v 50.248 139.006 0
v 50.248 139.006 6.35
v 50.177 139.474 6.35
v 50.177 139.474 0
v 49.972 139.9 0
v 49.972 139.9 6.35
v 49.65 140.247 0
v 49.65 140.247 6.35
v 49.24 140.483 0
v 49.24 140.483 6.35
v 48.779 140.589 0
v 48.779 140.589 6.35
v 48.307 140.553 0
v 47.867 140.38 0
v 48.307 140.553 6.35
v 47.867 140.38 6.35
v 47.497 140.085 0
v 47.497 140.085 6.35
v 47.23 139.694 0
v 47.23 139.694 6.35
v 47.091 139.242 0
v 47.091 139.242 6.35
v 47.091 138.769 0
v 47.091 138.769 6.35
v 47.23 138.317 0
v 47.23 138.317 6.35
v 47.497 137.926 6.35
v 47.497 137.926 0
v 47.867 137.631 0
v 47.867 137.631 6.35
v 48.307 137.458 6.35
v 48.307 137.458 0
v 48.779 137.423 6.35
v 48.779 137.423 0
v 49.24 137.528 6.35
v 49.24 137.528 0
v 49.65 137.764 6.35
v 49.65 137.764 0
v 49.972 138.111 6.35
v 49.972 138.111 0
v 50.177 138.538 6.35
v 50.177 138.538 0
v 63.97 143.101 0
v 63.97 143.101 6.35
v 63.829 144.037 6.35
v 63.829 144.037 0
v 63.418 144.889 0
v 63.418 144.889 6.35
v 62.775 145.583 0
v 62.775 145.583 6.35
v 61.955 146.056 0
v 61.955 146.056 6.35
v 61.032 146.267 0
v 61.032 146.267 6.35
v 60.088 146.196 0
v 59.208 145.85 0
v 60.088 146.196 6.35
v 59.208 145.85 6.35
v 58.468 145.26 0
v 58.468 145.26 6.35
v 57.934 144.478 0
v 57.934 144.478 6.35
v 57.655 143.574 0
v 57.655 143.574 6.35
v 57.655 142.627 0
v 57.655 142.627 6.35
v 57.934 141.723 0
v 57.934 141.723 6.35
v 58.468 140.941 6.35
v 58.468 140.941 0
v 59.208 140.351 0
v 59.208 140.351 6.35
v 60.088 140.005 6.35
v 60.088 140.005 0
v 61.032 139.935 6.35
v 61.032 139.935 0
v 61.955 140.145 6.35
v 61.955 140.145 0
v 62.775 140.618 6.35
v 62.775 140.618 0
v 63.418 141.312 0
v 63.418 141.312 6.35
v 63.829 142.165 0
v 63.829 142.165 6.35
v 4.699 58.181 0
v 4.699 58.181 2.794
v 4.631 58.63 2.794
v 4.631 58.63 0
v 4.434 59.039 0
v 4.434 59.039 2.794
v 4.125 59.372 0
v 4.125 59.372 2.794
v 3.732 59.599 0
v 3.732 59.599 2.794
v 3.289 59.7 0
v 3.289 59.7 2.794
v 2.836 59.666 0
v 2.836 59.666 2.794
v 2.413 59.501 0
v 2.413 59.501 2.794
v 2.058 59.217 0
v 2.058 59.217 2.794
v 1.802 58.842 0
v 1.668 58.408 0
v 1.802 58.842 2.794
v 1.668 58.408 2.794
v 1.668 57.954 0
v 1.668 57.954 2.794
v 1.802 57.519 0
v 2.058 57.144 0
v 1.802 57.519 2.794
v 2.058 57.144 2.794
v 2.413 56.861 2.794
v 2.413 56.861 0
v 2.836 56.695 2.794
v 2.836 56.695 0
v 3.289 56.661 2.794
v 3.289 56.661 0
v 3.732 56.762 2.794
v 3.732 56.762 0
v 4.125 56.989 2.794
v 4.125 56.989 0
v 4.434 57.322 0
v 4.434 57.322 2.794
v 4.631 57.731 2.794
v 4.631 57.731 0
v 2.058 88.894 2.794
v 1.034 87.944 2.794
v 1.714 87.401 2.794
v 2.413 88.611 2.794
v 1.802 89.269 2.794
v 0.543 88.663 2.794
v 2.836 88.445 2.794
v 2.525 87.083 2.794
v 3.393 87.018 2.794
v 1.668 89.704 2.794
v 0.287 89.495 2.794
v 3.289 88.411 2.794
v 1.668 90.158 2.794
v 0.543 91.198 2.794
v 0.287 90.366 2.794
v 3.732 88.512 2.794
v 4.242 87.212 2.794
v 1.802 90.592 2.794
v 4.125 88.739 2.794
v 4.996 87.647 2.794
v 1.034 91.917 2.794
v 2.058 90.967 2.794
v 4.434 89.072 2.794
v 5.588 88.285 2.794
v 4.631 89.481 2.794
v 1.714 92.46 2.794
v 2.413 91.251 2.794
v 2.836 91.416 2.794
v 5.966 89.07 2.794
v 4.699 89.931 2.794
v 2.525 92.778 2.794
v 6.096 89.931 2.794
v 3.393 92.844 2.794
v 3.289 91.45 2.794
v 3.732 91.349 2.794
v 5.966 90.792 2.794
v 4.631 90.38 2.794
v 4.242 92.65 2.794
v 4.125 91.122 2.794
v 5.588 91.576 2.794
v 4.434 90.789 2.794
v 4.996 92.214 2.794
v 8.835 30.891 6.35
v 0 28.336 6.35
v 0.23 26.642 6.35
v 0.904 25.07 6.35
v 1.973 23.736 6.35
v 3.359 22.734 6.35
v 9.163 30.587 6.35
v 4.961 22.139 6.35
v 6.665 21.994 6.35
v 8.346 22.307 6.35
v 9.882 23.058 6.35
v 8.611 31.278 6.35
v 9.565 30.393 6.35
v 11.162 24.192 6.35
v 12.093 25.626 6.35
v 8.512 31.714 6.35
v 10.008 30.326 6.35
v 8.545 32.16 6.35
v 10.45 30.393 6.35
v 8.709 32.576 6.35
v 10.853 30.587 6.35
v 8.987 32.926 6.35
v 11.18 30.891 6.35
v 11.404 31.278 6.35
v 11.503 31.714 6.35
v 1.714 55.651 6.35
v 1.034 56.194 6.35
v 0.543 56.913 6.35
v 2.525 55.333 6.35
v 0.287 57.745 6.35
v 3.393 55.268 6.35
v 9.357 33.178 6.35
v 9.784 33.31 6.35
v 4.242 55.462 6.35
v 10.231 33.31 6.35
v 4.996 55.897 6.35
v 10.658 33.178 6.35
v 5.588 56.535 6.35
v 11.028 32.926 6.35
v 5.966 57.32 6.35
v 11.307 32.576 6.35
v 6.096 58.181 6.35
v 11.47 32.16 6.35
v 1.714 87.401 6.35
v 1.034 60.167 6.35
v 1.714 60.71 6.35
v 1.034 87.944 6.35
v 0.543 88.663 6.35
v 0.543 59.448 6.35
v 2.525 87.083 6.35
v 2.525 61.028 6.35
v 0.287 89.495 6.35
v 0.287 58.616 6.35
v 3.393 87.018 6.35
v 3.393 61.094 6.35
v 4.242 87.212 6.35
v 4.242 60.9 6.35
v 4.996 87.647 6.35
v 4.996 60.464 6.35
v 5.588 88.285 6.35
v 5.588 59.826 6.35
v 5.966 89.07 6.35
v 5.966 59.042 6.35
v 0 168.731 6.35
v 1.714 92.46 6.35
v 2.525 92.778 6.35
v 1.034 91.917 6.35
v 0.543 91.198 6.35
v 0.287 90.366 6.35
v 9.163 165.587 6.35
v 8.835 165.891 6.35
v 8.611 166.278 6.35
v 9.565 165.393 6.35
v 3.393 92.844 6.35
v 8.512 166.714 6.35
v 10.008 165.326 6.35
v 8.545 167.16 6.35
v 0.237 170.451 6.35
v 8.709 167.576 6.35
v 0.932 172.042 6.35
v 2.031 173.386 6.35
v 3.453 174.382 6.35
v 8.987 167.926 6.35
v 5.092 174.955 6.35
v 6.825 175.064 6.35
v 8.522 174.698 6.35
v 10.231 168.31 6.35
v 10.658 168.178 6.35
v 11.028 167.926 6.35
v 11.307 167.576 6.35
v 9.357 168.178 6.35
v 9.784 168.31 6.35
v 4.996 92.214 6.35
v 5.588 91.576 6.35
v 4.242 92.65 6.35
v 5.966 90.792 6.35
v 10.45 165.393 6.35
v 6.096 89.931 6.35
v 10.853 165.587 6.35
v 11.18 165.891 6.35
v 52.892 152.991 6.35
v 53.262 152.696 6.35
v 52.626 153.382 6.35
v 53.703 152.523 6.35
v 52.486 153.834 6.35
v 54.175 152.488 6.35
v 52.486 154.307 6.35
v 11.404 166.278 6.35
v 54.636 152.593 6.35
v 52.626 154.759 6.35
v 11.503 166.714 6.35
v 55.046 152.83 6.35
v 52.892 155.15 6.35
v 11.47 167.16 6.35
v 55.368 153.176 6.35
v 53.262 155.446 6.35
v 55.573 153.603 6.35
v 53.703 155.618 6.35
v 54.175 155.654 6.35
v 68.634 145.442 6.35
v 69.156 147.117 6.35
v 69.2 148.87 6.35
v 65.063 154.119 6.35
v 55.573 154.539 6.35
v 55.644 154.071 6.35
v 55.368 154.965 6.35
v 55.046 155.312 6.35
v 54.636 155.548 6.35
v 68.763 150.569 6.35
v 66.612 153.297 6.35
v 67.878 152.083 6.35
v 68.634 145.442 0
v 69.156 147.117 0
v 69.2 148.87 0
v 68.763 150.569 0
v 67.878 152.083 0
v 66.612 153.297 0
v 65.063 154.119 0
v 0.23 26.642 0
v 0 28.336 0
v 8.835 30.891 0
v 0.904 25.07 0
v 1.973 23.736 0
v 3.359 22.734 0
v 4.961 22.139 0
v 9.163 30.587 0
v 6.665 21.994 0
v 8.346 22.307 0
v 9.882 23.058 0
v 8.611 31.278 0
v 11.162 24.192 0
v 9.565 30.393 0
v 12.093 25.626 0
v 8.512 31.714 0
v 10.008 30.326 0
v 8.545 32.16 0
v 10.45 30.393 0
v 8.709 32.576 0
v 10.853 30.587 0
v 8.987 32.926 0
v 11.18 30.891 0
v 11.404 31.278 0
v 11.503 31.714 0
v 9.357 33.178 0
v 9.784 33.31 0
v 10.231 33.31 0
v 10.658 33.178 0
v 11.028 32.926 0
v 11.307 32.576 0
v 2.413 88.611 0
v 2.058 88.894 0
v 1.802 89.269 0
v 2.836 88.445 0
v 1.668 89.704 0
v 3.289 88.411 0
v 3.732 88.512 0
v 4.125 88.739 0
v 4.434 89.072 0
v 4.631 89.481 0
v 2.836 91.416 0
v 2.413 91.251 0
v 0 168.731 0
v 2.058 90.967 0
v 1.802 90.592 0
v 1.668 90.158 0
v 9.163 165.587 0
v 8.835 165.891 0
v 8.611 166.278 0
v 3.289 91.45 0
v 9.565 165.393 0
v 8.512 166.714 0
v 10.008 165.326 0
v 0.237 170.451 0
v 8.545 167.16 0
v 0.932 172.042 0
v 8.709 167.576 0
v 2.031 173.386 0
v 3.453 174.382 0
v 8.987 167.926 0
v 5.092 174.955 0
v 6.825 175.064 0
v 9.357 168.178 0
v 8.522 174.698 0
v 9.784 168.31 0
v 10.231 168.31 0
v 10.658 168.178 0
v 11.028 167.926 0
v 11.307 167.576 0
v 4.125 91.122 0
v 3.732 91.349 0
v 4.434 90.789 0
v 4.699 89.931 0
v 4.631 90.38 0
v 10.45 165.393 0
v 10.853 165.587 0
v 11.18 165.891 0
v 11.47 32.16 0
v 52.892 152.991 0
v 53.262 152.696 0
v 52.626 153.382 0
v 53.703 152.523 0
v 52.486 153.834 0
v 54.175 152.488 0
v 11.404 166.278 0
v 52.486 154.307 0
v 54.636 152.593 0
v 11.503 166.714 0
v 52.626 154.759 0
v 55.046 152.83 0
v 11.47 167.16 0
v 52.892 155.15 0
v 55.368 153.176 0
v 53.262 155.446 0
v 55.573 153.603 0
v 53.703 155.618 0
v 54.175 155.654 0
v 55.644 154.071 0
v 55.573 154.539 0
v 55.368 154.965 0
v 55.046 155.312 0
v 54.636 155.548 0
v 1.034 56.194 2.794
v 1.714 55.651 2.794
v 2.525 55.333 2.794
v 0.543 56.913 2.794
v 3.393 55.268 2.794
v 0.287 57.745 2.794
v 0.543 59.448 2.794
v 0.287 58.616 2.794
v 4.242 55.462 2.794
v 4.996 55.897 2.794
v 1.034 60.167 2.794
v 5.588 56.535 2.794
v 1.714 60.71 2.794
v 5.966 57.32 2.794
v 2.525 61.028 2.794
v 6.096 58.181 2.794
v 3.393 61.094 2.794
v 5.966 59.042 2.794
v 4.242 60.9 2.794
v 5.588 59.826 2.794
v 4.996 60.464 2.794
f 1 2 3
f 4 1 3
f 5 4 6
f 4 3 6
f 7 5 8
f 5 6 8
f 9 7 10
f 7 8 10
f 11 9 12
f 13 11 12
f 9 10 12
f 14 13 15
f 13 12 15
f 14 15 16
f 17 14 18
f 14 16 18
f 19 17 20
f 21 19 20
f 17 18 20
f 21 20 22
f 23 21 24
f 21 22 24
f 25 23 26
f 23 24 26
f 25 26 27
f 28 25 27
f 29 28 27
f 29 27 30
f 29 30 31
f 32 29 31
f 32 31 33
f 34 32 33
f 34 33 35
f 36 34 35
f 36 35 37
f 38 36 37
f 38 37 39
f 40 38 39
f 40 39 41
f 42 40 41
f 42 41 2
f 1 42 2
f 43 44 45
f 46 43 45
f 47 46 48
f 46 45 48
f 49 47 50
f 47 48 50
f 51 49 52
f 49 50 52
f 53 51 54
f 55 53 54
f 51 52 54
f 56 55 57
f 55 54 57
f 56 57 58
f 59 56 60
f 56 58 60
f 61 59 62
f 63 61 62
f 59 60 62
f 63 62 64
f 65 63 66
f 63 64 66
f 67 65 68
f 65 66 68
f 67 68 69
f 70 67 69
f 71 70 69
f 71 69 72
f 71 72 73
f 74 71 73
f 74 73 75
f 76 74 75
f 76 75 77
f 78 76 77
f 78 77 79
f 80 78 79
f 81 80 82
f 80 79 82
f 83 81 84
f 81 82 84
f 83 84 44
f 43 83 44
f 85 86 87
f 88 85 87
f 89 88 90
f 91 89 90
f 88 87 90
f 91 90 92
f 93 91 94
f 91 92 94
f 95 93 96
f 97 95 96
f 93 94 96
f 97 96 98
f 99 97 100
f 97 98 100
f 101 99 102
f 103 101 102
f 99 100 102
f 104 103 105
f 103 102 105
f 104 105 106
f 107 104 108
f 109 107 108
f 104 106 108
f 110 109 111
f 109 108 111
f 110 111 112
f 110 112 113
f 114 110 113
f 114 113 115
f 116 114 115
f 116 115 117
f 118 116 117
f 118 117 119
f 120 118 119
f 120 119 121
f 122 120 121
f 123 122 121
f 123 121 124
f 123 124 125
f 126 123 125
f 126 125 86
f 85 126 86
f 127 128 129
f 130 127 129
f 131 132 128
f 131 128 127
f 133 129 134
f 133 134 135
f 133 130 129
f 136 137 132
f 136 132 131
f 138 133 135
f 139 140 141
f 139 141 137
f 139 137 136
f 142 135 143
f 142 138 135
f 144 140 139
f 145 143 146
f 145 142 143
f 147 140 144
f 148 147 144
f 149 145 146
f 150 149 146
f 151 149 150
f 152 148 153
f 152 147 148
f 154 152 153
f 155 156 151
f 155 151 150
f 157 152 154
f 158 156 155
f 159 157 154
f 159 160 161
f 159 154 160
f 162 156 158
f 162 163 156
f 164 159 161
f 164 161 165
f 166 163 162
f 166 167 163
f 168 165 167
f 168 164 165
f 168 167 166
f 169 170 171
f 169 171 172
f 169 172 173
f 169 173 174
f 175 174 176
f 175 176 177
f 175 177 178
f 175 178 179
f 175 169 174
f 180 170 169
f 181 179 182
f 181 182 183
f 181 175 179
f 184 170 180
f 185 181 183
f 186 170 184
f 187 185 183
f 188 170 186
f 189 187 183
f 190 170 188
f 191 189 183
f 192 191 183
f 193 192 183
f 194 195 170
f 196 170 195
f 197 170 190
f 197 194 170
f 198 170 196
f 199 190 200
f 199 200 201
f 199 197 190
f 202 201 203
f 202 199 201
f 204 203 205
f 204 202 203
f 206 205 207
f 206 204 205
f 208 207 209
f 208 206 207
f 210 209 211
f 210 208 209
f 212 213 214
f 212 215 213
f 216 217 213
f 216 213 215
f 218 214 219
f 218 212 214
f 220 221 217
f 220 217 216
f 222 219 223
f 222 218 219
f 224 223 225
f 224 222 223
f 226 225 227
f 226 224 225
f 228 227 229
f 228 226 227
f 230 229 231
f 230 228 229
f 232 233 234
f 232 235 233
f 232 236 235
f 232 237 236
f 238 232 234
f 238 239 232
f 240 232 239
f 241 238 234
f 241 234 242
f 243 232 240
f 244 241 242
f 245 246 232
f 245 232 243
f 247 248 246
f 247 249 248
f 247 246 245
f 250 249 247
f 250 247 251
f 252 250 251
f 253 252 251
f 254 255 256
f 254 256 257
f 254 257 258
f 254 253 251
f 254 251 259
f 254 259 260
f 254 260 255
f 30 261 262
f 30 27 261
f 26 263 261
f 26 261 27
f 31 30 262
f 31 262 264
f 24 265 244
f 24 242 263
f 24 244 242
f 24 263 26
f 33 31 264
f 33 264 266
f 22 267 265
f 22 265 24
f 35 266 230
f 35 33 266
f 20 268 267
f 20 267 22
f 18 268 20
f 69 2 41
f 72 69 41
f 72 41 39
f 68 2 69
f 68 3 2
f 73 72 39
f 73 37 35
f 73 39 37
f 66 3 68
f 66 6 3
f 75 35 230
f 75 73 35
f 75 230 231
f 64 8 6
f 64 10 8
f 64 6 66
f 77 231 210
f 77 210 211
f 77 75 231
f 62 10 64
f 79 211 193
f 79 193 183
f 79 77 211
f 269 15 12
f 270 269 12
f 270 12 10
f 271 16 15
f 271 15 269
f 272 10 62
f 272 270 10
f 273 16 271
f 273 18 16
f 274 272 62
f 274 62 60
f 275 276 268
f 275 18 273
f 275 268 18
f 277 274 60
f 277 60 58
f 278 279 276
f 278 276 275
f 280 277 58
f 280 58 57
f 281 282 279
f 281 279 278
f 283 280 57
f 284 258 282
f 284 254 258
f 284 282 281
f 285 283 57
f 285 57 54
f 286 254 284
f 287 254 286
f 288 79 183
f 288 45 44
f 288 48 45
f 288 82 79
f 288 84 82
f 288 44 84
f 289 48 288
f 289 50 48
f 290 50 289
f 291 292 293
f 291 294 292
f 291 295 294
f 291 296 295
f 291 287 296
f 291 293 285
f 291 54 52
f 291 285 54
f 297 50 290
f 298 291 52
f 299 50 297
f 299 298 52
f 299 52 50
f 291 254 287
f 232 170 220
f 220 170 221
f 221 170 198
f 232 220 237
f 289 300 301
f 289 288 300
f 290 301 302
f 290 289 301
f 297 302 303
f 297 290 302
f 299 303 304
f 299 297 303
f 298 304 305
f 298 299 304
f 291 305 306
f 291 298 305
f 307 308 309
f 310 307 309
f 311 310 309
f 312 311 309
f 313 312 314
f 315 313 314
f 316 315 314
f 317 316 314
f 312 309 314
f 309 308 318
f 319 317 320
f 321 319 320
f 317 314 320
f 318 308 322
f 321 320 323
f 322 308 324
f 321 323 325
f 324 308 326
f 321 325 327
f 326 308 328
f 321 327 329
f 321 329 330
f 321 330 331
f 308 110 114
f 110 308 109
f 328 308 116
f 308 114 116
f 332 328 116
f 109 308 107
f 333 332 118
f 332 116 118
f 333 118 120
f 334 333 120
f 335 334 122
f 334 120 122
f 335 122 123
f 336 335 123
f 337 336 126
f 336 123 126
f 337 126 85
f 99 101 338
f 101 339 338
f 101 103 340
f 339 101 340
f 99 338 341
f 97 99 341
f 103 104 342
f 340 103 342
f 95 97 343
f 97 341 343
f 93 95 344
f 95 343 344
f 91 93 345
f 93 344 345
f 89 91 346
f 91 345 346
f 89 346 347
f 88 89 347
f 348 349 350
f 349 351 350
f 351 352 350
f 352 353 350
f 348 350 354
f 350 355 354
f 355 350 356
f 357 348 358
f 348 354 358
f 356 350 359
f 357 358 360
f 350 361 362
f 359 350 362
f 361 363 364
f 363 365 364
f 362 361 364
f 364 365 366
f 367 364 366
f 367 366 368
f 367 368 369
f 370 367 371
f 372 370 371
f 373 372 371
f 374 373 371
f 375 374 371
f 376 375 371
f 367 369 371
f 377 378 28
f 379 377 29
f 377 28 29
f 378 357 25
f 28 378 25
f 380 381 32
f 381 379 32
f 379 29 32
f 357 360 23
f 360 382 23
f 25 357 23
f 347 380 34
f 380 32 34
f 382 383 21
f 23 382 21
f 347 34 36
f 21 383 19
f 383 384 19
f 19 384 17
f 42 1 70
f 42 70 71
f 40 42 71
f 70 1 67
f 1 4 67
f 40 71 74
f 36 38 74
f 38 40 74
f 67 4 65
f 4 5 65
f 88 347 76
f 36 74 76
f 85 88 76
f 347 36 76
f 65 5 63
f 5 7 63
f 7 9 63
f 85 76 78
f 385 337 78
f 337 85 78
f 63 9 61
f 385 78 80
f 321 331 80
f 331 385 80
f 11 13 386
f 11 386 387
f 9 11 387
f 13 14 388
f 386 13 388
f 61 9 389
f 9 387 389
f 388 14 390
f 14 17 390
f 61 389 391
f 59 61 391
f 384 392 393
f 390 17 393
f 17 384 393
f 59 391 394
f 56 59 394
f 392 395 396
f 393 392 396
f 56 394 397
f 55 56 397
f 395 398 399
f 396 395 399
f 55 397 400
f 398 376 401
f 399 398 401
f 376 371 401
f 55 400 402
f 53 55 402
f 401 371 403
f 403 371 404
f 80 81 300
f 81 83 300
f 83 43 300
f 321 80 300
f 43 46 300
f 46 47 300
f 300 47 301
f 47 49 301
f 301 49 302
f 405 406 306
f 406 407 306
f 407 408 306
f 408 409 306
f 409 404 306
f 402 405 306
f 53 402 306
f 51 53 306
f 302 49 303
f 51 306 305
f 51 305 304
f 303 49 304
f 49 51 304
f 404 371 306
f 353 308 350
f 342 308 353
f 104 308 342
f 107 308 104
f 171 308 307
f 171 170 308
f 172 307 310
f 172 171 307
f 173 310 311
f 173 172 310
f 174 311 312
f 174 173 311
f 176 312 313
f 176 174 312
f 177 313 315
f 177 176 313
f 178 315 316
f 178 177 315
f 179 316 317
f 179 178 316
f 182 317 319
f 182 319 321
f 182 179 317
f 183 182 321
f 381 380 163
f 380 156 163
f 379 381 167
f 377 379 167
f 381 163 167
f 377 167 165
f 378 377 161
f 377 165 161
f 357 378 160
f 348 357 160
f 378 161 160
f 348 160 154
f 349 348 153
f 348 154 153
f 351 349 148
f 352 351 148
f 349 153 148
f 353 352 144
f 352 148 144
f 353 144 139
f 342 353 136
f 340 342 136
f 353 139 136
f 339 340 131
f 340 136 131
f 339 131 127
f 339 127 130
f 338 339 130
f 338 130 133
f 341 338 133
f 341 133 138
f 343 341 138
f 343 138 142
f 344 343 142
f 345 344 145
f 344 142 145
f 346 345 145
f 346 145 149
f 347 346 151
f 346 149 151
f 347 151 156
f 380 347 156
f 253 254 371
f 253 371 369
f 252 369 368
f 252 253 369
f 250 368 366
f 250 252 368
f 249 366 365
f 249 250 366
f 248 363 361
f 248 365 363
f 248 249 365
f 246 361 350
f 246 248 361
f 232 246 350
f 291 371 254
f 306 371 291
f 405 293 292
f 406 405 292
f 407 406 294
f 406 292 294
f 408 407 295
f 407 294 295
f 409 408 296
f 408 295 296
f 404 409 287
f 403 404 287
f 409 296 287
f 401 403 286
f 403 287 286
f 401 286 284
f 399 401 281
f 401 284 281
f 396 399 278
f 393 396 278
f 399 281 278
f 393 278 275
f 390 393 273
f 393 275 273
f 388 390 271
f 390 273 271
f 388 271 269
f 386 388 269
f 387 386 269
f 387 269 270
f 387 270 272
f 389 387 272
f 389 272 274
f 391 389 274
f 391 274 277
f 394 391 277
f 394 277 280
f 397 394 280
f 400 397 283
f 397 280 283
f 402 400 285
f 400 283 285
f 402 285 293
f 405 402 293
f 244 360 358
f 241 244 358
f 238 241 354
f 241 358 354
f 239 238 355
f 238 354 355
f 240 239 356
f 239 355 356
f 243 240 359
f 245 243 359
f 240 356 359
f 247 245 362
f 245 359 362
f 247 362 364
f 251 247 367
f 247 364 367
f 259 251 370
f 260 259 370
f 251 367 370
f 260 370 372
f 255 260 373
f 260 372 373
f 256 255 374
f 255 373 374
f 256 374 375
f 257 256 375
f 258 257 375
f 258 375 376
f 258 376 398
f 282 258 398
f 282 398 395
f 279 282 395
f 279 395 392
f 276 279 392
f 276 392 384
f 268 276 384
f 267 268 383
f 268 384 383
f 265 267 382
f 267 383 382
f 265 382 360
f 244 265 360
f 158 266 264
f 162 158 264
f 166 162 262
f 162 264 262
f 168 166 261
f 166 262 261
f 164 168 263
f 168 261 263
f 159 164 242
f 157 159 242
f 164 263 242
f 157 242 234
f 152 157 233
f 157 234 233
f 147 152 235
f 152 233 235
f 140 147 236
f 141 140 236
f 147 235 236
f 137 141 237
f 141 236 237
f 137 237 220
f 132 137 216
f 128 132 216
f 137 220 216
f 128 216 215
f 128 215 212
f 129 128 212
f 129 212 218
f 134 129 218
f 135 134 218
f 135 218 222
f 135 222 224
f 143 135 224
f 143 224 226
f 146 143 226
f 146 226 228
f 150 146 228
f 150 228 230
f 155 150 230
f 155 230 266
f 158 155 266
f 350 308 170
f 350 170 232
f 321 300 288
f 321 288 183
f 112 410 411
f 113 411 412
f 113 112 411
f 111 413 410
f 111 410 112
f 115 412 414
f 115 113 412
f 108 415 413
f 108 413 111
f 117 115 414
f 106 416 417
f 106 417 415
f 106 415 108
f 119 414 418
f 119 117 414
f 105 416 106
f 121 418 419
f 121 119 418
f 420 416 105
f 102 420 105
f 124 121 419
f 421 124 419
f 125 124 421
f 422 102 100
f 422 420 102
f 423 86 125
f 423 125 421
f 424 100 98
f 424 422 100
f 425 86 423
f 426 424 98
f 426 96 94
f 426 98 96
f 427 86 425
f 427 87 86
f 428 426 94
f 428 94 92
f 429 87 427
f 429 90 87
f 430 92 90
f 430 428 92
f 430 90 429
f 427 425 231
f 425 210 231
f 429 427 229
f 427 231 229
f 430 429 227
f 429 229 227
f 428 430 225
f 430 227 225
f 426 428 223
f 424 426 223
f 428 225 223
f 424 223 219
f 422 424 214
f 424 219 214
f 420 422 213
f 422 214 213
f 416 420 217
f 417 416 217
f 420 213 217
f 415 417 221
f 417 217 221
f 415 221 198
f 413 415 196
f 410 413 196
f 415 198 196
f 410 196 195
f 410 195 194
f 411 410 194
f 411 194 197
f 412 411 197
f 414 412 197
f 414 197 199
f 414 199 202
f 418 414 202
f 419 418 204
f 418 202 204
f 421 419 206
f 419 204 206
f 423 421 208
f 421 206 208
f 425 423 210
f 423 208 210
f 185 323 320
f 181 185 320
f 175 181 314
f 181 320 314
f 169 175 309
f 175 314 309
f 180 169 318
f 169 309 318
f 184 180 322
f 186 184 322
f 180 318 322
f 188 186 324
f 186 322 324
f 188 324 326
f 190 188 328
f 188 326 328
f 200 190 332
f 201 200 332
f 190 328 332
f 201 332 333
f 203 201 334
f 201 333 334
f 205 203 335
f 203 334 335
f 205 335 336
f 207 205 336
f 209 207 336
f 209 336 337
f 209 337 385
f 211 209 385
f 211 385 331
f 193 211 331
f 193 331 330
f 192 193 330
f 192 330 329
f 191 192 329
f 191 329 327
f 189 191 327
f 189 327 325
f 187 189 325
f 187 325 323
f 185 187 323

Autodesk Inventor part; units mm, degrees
ref_plane "YZ Plane" through (0, 0, 0) normal (1, 0, 0) x (0, 1, 0)
ref_plane "XZ Plane" through (0, 0, 0) normal (0, 1, 0) x (-1, 0, 0)
ref_plane "XY Plane" through (0, 0, 0) normal (0, 0, 1) x (1, 0, 0)
sketch "Sketch1" plane through (0, 0, 0) normal (0, 0, 1) x (1, 0, 0)
  line L0 (0, 0) -> (0, 177.8)
  line L1 (0, 0) -> (53.8815, 0) construction
  line L2 (0, 177.8) -> (71.6046, 151.7381)
  line L3 (0, 177.8) -> (76.2, 177.8) construction
  line L4 (71.6046, 151.7381) -> (0, 0)
  dimension "d0" = 177.8
  dimension "d19" = 76.2
  dimension "d20" = 20
extrude "Extrusion1" add sketch "Sketch1" along normal blind 6.35
fillet "Fillet1" radius 6.35 2 edges at (0, 177.8, 3.175) (0, 0, 3.175)
fillet "Fillet4" radius 6.35 1 edges at (71.6046, 151.7381, 3.175)
sketch "Sketch3" plane through (0, 0, 6.35) normal (0, 0, 1) x (1, 0, 0)
  circle A0 centre (3.175, 58.1807) radius 1.524
  circle A1 centre (3.175, 89.9307) radius 1.524
  line L0 (0, 168.7313) -> (0, 28.3357) projected
  point P0 (0, 0)
  dimension "d22" = 3.048
  dimension "d23" = 3.048
  dimension "d24" = 3.175
  dimension "d25" = 3.175
  dimension "d26" = 29.845
  dimension "d27" = 31.75
extrude "Extrusion3" cut sketch "Sketch3" against normal through all
sketch "Sketch4" plane through (0, 0, 6.35) normal (0, 0, 1) x (1, 0, 0)
  circle A0 centre (3.175, 58.1807) radius 1.524 projected
  circle A1 centre (3.175, 58.1807) radius 2.921
  circle A2 centre (3.175, 89.9307) radius 1.524 projected
  circle A3 centre (3.175, 89.9307) radius 2.921
  point P0 (0, 0)
  dimension "d30" = 5.842
  dimension "d31" = 5.842
extrude "Extrusion4" cut sketch "Sketch4" against normal blind 3.556
sketch "Sketch5" plane through (0, 0, 6.35) normal (0, 0, 1) x (1, 0, 0)
  circle A0 centre (60.795, 143.1007) radius 3.175
  point P0 (0, 0)
  point P1 (8.5218, 174.6983)
  dimension "d34" = 6.35
  dimension "d35" = 52.2732
  dimension "d36" = 31.5976
extrude "Extrusion5" cut sketch "Sketch5" against normal through all
sketch "Sketch6" plane through (0, 0, 6.35) normal (0, 0, 1) x (1, 0, 0)
  line L0 (0, 168.7313) -> (0, 28.3357) projected
  arc A0 (8.5218, 174.6983) -> (0, 168.7313) centre (6.35, 168.7313) ccw projected
  point P0 (0, 0)
  point P1 (10.0076, 166.8263)
  point P2 (10.0076, 31.8263)
  dimension "d39" = 10.0076
  dimension "d40" = 1.905
  dimension "d41" = 136.905
  dimension "d42" = 0
hole "Hole1" at (10.0076, 31.8263, 6.35) at (10.0076, 166.8263, 6.35) direction (0, 0, -1) diameter 3 end through all
sketch "Sketch7" plane through (0, 0, 6.35) normal (0, 0, 1) x (1, 0, 0)
  line L0 (65.0627, 154.1191) -> (8.5218, 174.6983) projected
  line L1 (12.0927, 25.6258) -> (68.6335, 145.4421) projected
  circle A0 centre (48.6603, 139.0056) radius 1.5875
  circle A1 centre (54.0562, 154.0707) radius 1.5875
  point P0 (0, 0)
  dimension "d52" = 3.81
  dimension "d53" = 19.812
  dimension "d54" = 15.3162
  dimension "d55" = 16.8656
  dimension "d56" = 3.175
  dimension "d57" = 3.175
extrude "Extrusion6" cut sketch "Sketch7" against normal through all
equation "\"d22\" = d23"
properties part number "Triangle axle slide connector"
